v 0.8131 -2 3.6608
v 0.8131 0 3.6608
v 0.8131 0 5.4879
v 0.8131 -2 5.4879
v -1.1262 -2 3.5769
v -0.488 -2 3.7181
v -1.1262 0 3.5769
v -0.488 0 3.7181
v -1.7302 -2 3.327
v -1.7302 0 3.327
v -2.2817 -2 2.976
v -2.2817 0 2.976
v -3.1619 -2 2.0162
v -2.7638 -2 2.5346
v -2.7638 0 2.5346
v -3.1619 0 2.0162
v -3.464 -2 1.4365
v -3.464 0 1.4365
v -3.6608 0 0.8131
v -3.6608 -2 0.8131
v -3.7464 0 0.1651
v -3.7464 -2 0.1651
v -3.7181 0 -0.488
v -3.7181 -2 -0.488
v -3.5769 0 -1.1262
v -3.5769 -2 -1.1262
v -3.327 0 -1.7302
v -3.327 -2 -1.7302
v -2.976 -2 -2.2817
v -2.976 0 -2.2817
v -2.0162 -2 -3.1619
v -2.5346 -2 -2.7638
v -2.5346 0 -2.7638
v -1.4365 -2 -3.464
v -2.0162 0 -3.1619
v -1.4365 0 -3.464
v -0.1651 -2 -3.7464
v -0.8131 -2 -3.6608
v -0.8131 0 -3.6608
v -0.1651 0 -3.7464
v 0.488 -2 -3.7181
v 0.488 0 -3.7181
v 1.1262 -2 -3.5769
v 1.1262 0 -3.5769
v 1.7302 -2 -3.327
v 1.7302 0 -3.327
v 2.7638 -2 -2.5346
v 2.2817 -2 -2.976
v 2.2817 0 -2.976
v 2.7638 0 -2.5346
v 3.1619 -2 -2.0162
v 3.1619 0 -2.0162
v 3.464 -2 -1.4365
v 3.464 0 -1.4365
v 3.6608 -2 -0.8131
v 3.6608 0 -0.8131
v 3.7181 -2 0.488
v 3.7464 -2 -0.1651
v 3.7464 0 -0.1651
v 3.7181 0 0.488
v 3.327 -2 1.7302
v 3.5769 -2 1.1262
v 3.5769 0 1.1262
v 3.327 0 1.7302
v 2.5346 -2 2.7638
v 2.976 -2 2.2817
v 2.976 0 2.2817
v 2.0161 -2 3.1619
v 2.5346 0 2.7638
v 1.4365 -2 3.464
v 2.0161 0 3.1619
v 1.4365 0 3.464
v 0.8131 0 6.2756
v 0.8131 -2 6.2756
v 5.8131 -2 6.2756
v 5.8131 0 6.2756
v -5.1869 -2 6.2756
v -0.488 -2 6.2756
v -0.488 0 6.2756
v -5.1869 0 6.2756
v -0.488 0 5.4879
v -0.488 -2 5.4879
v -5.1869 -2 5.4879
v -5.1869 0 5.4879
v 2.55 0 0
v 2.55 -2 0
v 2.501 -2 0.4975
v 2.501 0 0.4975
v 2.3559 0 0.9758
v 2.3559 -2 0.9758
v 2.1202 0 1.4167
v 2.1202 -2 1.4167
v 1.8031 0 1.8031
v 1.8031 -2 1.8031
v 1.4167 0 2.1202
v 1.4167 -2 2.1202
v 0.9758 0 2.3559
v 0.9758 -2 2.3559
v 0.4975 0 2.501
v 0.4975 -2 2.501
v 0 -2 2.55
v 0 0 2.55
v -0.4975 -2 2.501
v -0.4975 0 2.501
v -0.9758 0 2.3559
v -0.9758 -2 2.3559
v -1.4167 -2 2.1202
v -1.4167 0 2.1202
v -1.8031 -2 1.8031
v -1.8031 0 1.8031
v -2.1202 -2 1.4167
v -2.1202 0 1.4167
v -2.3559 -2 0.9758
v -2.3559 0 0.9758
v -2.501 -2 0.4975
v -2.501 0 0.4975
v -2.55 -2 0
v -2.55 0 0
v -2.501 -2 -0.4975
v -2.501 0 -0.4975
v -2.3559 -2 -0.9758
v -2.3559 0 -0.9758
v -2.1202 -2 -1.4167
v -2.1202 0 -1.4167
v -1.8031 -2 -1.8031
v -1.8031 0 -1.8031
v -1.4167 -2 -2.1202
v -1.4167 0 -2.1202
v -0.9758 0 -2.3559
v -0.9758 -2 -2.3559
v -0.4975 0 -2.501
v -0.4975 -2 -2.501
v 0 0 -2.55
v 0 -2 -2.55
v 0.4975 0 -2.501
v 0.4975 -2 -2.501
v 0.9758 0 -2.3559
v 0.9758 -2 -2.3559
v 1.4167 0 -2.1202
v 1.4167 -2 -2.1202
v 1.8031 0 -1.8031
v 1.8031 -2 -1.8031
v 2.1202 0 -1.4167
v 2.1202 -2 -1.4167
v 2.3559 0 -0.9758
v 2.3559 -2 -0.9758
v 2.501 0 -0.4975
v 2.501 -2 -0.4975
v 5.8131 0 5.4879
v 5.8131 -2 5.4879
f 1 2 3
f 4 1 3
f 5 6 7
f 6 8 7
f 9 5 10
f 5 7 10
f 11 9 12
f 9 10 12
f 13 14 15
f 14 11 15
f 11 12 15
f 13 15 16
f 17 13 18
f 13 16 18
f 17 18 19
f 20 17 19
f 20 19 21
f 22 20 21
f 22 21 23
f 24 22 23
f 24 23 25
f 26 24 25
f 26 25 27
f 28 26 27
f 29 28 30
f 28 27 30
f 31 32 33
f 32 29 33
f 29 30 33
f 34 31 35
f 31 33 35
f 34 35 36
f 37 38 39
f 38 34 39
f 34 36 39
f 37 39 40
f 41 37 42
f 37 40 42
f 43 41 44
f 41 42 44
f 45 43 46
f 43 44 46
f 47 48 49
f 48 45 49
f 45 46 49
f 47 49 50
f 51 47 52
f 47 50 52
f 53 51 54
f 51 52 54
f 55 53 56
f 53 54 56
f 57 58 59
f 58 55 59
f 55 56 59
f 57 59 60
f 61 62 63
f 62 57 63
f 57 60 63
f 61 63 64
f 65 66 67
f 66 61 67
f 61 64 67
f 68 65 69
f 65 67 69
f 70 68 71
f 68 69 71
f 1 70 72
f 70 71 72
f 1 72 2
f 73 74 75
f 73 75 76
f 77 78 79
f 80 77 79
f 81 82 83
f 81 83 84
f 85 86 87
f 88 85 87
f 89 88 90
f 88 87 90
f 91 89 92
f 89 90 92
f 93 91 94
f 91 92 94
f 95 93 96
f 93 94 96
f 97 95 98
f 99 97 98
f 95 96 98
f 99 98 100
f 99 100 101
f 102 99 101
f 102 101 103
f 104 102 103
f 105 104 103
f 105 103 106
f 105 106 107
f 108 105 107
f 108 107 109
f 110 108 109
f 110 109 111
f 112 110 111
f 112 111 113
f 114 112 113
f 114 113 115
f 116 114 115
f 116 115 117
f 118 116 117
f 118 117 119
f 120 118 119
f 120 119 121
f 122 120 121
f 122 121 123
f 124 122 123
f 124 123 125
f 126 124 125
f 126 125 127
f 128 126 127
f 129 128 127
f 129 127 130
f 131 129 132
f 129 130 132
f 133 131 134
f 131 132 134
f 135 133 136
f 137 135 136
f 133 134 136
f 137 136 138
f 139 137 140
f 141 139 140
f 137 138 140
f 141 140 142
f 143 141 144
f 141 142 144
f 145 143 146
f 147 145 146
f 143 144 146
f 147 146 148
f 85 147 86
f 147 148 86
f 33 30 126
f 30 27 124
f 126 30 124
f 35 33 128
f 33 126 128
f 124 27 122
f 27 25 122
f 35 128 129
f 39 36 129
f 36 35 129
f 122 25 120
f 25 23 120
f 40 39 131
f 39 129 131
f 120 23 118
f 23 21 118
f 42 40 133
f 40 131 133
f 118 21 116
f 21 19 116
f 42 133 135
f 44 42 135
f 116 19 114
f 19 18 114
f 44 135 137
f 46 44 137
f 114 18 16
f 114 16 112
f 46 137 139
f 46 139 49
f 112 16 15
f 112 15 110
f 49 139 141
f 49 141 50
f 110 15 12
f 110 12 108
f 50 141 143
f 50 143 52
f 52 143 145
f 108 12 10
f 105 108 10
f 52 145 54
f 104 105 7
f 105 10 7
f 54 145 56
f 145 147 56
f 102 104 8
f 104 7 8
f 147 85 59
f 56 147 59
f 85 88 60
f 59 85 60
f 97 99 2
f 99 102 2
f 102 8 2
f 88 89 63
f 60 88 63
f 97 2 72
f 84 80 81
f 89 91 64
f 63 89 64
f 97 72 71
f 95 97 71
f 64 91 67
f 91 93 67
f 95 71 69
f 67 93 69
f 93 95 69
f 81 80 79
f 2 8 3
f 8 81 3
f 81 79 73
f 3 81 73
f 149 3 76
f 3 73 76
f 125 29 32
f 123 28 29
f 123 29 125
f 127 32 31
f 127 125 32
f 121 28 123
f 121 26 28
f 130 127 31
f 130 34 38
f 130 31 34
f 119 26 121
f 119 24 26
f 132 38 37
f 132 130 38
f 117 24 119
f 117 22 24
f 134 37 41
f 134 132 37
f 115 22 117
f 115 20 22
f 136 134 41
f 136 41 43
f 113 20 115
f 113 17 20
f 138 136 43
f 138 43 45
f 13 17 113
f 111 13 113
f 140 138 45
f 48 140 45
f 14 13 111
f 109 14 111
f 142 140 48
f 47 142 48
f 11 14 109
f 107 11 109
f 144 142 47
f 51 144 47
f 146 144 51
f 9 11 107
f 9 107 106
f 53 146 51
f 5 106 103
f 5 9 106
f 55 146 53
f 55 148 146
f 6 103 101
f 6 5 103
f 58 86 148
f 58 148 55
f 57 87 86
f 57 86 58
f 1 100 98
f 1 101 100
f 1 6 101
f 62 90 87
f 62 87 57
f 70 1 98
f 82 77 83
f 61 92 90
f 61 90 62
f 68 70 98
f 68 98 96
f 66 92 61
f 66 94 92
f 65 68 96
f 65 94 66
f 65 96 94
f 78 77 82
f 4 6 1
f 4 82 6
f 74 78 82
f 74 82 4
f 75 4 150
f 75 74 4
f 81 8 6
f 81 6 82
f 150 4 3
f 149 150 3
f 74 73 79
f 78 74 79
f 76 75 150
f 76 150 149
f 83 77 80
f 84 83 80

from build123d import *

# Parameters (mm, degrees)
F0_R          = 3.75
F1_DEPTH      = 2
F2_R          = 2.55
F3_DEPTH      = 25
F4_R          = 2.55
F5_DEPTH      = 25
F6_W          = 1.301092
F6_H          = 2.819048
F7_DEPTH      = 2
F8_W          = 2
F8_H          = 0.787675
F9_DEPTH      = 5
F9_DEPTH_BACK = 6


with BuildPart() as f1:
    # F0 (on Front) → F1 (new body)
    with BuildSketch(Plane.XZ):
        Circle(F0_R)
    extrude(amount=F1_DEPTH)

    # F2 (on Front) → F3 (cut)
    with BuildSketch(Plane.XZ):
        Circle(F2_R)
    extrude(amount=-F3_DEPTH, mode=Mode.SUBTRACT)

    # F4 (on face) → F5 (cut)
    with BuildSketch(Plane.XZ.offset(2)):
        Circle(F4_R)
    extrude(amount=-F5_DEPTH, mode=Mode.SUBTRACT)

    # F6 (on face) → F7 (join)
    with BuildSketch(Plane(origin=(0, 0, 0), x_dir=(-1, 0, 0), z_dir=(0, 1, 0))):
        with Locations((-0.162579, 4.866066)):
            Rectangle(F6_W, F6_H)
    extrude(amount=-F7_DEPTH)

    # F8 (on face) → F9 (join, two sides)
    with BuildSketch(Plane.YZ.offset(0.813125)) as f9_sk:
        with Locations((-1, 5.881752)):
            Rectangle(F8_W, F8_H)
    extrude(amount=F9_DEPTH)
    extrude(f9_sk.sketch, amount=-F9_DEPTH_BACK)


solid = f1.part
